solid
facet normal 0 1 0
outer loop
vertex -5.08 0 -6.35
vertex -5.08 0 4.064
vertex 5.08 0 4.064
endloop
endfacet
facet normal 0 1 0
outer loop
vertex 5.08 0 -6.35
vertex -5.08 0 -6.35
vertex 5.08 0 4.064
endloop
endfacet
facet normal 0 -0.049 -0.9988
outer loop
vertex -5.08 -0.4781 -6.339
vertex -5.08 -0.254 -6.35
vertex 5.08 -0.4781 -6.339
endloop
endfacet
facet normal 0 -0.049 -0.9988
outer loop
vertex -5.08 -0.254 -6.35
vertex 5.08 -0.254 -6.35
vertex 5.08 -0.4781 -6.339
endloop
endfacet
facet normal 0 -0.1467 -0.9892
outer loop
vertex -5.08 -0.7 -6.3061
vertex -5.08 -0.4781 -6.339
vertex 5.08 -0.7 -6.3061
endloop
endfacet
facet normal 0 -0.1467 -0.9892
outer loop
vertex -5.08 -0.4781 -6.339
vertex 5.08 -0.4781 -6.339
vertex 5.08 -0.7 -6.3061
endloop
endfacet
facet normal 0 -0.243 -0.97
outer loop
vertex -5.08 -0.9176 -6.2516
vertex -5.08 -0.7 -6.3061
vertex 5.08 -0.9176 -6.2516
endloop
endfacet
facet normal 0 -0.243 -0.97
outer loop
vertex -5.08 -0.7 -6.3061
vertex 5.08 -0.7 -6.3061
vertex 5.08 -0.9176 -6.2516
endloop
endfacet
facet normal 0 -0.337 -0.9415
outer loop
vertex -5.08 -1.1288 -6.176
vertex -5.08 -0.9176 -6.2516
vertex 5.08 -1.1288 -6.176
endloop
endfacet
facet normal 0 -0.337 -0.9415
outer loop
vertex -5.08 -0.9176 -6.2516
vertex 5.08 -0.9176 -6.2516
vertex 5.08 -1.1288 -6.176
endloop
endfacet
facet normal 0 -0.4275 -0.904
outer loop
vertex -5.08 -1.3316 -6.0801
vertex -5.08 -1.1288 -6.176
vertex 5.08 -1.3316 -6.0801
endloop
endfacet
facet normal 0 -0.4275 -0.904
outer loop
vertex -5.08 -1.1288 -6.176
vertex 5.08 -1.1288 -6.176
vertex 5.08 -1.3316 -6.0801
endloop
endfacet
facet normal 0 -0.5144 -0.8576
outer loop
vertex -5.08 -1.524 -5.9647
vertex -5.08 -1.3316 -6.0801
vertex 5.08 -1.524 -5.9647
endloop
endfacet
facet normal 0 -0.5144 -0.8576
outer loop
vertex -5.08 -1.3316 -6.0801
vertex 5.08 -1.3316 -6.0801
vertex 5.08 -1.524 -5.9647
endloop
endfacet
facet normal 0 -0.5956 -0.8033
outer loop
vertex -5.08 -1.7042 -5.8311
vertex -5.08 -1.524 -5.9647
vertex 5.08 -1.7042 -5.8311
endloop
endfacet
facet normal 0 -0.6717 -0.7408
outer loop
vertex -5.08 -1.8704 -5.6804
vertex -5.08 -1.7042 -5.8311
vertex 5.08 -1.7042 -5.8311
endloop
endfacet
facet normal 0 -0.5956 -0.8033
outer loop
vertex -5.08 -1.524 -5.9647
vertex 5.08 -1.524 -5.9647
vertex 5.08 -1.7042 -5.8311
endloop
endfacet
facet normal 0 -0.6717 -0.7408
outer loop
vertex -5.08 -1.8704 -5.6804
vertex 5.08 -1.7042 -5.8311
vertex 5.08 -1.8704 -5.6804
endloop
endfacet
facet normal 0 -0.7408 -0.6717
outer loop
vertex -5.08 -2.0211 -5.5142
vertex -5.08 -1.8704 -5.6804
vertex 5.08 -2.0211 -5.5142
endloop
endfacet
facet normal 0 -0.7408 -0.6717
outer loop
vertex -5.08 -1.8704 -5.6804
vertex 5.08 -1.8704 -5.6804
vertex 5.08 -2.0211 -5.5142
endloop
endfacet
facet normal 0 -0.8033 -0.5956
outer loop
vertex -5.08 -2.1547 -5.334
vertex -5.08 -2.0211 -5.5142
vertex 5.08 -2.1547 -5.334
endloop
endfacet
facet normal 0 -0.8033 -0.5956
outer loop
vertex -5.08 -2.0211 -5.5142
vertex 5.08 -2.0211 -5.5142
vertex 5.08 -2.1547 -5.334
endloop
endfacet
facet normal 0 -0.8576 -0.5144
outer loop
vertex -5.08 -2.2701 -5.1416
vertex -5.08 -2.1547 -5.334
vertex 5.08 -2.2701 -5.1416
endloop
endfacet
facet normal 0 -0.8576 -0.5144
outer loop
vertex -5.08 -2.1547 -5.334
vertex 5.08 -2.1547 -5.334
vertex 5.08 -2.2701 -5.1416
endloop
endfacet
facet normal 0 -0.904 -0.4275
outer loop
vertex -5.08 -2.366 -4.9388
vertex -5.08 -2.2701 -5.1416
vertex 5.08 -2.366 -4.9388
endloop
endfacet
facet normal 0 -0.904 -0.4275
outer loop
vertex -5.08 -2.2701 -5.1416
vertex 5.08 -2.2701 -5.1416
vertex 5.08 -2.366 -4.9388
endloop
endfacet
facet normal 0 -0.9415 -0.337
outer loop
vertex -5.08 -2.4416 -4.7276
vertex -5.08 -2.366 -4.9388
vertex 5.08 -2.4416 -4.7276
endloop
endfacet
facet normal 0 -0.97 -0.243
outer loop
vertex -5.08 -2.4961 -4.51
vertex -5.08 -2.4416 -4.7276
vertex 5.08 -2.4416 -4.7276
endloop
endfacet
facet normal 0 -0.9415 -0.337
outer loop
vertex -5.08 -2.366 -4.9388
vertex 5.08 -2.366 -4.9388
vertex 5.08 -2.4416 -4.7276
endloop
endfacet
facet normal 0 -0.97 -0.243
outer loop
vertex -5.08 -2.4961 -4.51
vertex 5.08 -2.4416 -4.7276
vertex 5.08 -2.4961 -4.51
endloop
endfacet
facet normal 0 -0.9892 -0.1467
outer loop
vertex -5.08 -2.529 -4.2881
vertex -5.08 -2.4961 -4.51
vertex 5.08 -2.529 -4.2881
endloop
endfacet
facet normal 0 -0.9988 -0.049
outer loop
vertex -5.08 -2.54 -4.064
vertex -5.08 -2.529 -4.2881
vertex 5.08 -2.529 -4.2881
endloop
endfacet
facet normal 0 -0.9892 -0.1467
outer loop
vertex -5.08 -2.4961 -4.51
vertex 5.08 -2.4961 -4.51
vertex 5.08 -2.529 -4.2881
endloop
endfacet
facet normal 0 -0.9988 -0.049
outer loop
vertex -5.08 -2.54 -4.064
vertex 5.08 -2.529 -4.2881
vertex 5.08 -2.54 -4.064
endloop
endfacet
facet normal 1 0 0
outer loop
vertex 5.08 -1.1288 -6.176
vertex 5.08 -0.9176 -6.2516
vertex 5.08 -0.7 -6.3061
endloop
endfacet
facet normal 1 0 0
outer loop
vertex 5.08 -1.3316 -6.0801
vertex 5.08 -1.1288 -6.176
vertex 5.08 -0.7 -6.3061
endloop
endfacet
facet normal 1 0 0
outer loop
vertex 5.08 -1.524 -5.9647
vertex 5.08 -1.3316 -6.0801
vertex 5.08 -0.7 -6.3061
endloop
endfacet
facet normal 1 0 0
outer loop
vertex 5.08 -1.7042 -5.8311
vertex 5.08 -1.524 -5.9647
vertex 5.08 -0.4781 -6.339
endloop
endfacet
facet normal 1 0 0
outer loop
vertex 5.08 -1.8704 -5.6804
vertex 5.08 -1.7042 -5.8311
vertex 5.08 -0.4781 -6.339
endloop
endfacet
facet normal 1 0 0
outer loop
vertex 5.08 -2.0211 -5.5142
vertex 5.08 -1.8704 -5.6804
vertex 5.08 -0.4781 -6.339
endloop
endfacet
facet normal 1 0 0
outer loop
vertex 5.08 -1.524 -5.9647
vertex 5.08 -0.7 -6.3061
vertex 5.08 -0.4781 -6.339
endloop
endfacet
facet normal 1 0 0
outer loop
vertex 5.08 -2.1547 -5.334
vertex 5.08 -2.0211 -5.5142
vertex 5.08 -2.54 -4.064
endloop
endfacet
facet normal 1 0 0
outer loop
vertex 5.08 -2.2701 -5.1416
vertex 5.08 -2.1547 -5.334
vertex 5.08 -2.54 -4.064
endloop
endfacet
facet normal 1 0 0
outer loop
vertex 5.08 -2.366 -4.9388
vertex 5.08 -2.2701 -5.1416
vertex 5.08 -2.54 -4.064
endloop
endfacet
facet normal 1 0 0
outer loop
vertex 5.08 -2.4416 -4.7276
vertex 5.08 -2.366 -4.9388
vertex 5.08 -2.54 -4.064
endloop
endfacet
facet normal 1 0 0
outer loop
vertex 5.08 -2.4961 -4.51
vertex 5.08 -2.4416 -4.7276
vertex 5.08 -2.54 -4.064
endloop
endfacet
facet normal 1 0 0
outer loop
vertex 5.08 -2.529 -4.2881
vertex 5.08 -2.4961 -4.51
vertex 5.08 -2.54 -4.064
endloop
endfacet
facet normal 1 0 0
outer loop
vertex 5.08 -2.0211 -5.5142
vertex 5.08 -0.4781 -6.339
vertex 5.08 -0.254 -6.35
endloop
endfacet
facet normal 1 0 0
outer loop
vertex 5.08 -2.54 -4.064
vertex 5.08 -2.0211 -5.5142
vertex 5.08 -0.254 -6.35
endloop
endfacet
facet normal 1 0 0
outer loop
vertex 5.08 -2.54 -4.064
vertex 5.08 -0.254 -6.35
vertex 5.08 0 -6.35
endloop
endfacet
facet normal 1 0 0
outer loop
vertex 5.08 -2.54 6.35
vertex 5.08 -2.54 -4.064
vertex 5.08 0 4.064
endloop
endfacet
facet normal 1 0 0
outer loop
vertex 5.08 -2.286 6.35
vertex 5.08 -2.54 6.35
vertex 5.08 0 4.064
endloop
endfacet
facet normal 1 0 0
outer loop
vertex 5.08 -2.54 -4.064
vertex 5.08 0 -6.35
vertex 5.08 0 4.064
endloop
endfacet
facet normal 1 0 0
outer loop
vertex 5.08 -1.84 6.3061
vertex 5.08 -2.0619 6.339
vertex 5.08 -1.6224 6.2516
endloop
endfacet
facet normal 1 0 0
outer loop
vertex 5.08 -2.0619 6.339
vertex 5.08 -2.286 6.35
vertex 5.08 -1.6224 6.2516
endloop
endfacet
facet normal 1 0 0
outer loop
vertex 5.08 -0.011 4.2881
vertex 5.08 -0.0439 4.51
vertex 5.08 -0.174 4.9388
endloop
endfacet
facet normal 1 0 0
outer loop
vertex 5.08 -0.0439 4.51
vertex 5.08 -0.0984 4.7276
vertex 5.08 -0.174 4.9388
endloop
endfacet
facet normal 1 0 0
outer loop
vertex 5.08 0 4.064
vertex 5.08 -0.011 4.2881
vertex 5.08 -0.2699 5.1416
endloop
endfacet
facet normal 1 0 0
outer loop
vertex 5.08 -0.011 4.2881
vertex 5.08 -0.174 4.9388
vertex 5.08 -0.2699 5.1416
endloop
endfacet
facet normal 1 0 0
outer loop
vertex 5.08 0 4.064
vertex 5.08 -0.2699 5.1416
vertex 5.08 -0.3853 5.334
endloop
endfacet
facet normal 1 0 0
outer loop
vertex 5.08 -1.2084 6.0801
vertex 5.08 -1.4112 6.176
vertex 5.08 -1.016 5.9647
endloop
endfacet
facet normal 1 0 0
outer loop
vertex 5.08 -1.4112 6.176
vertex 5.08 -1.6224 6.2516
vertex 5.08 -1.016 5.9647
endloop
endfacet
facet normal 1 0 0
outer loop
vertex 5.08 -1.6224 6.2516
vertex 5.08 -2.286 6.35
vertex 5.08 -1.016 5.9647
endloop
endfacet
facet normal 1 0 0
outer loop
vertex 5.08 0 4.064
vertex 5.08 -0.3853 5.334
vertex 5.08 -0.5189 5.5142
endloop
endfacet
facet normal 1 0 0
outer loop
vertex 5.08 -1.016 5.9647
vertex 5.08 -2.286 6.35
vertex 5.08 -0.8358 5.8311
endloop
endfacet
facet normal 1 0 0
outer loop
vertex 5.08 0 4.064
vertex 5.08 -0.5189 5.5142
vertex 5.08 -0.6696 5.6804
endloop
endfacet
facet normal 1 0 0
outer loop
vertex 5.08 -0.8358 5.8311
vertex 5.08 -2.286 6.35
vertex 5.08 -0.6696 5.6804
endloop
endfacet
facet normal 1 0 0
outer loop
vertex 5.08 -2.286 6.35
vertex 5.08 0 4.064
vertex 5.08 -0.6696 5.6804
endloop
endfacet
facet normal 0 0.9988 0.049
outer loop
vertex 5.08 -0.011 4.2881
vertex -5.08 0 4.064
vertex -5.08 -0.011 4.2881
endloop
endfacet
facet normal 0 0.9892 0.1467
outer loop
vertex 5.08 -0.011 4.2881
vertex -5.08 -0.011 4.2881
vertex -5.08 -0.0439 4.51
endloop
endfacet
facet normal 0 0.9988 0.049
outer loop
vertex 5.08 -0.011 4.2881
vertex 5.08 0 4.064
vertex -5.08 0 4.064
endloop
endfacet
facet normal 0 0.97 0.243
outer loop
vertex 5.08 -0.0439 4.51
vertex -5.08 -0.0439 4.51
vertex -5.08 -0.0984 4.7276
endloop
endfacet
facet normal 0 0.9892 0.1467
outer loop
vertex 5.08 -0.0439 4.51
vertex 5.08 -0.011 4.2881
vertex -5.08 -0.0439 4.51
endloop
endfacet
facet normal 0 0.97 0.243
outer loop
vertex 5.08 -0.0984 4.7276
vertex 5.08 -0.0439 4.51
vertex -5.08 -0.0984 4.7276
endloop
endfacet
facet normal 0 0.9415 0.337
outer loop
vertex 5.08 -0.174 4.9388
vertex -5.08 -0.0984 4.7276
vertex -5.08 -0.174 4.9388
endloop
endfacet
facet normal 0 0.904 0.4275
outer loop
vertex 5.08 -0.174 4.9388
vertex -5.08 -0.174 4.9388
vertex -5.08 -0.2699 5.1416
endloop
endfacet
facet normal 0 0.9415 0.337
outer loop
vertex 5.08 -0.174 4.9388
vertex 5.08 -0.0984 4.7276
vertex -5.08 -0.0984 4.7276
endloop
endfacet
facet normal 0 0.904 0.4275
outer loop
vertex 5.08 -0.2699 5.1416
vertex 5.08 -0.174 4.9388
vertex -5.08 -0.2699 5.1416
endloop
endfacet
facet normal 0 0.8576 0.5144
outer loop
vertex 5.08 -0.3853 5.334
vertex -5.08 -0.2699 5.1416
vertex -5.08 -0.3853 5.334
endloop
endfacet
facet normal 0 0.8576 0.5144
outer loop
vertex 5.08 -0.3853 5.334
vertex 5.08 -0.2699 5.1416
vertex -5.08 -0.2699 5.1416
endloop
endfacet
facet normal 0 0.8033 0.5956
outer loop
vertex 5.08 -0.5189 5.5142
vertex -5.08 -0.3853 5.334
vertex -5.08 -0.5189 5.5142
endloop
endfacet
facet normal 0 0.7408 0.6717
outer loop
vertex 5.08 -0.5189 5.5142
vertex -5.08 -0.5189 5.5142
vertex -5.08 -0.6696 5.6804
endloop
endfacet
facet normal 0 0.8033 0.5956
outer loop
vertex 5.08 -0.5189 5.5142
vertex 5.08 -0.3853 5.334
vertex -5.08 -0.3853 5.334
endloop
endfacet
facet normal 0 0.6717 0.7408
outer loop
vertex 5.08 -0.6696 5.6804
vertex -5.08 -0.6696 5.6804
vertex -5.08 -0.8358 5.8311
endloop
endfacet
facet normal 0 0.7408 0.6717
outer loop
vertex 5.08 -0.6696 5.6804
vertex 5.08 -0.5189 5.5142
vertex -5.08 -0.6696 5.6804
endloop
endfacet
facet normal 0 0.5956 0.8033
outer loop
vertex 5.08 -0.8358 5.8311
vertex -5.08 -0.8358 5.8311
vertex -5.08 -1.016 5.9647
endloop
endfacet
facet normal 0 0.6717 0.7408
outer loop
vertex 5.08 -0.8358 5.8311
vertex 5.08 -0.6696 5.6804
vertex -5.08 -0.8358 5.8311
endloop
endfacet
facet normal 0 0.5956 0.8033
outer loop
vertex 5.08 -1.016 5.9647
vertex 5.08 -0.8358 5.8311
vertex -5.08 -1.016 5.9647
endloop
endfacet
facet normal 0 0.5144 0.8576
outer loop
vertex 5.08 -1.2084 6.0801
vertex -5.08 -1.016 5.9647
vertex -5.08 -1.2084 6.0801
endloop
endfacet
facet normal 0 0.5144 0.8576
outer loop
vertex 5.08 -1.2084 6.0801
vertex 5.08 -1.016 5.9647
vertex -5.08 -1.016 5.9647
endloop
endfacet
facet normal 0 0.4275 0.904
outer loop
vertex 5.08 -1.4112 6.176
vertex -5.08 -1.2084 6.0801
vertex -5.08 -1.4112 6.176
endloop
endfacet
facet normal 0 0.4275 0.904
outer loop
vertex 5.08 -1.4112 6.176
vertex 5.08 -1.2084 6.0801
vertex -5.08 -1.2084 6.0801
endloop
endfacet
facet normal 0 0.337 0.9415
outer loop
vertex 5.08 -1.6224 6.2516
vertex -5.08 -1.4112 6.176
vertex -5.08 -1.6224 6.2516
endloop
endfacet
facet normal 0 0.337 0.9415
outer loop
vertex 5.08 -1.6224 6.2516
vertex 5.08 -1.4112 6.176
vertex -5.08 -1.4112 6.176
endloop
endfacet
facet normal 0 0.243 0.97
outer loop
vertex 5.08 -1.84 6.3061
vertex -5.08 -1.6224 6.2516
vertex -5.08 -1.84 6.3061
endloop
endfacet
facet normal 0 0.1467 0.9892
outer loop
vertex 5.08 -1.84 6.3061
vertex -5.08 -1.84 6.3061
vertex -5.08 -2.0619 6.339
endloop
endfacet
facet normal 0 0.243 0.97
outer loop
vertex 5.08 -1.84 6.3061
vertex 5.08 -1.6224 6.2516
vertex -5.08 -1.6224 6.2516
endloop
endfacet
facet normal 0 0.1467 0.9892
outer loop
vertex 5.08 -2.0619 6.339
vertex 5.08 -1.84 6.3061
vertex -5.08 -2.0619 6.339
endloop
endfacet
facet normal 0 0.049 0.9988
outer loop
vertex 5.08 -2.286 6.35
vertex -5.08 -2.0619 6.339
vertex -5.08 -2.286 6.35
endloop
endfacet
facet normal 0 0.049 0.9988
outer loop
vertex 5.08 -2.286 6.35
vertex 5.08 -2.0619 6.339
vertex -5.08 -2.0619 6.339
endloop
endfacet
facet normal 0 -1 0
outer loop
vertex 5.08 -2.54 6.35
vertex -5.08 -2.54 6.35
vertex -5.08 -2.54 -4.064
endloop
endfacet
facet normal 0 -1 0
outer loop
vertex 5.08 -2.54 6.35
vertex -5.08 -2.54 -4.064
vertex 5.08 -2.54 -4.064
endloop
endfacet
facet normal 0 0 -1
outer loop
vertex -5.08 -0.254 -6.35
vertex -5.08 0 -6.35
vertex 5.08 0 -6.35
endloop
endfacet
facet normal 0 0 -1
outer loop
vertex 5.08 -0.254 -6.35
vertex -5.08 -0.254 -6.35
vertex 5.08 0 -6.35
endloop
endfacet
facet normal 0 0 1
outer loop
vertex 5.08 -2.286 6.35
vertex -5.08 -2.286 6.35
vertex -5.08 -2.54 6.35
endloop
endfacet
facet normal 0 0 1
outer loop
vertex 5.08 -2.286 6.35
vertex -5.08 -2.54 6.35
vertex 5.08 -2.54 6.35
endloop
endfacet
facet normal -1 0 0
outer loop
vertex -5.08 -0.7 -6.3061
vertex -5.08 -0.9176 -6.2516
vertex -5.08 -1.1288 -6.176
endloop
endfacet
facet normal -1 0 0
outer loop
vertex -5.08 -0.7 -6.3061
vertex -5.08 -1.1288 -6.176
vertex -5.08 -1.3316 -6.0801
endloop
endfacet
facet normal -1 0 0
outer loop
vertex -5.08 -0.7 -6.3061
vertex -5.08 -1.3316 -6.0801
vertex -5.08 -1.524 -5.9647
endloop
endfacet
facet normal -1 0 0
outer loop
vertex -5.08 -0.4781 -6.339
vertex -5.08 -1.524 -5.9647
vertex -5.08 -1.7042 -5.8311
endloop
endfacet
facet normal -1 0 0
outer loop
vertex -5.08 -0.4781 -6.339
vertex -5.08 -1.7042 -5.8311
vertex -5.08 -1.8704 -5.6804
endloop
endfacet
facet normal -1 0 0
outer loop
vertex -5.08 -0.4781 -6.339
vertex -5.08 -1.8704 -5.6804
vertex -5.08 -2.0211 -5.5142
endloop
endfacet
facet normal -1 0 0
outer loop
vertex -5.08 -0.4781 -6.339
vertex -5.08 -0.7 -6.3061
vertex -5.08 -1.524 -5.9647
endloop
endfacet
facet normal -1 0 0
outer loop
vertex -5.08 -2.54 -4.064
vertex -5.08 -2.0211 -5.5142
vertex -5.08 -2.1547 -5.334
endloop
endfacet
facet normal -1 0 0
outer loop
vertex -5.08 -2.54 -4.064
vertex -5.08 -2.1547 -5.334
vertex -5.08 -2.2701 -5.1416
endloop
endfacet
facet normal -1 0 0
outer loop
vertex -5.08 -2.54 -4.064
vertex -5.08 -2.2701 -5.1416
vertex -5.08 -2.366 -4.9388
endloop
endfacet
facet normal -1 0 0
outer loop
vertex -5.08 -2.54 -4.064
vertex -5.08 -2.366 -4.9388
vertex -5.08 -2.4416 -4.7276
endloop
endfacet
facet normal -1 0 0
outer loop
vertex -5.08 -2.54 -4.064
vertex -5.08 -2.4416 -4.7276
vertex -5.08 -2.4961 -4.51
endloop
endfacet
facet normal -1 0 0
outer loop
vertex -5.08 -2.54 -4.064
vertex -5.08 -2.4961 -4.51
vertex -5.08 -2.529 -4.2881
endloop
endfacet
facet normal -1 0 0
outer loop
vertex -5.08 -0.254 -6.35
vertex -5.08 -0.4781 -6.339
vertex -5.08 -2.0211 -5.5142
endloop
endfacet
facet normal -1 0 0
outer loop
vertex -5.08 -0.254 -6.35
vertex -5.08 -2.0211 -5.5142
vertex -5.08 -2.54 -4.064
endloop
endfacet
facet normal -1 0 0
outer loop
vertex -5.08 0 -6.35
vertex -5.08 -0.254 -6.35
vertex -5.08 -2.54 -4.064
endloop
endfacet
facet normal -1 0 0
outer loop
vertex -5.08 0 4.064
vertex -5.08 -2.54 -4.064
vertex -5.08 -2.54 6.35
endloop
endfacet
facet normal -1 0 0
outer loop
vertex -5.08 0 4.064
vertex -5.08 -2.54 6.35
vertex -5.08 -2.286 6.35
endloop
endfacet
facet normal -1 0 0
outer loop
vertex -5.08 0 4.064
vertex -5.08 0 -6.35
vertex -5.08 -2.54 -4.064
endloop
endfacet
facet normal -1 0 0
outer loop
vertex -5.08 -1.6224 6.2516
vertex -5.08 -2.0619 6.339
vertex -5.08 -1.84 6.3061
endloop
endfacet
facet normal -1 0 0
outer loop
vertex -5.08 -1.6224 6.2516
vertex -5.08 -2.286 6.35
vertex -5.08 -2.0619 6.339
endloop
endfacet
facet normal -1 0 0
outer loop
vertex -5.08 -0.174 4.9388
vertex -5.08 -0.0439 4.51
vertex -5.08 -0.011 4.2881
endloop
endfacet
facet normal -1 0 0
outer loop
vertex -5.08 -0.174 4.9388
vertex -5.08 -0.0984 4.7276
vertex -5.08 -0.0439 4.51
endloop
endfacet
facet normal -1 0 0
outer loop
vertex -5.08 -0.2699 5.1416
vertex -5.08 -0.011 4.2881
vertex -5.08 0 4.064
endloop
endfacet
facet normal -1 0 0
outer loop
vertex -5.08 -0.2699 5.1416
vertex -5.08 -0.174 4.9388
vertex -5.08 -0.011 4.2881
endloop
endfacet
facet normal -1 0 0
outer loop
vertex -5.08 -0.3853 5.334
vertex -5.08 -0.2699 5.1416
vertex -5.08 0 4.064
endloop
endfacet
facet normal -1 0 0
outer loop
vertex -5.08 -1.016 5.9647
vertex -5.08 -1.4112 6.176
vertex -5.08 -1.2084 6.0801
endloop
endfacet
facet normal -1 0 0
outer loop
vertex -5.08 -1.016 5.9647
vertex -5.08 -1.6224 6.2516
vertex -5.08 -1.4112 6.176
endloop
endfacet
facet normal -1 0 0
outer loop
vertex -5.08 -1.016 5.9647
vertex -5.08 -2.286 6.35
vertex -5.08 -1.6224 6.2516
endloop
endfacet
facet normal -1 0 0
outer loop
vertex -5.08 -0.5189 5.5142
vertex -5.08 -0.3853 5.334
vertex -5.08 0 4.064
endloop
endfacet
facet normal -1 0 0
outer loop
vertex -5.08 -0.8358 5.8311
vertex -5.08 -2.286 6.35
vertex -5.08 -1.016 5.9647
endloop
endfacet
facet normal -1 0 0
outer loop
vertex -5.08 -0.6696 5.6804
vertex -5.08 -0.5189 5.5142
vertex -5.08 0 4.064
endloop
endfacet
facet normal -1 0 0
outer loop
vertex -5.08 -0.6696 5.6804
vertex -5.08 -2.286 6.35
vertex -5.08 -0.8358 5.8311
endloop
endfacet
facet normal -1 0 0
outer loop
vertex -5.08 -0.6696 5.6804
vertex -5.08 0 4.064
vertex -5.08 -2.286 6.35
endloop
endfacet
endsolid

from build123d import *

# Parameters (mm, degrees)
F0_W     = 10.16
F0_H     = 12.7
F1_DEPTH = 2.54
F2_R     = 2.286
F3_R     = 2.286


with BuildPart() as f1:
    # F0 (on Front) → F1 (new body)
    with BuildSketch(Plane.XZ):
        Rectangle(F0_W, F0_H)
    extrude(amount=F1_DEPTH)

    # F2
    f2_edges = [f1.edges().sort_by_distance(p)[0] for p in [
        (0, -2.54, -6.35),
    ]]
    fillet(f2_edges, radius=F2_R)

    # F3
    f3_edges = [f1.edges().sort_by_distance(p)[0] for p in [
        (0, 0, 6.35),
    ]]
    fillet(f3_edges, radius=F3_R)


solid = f1.part
